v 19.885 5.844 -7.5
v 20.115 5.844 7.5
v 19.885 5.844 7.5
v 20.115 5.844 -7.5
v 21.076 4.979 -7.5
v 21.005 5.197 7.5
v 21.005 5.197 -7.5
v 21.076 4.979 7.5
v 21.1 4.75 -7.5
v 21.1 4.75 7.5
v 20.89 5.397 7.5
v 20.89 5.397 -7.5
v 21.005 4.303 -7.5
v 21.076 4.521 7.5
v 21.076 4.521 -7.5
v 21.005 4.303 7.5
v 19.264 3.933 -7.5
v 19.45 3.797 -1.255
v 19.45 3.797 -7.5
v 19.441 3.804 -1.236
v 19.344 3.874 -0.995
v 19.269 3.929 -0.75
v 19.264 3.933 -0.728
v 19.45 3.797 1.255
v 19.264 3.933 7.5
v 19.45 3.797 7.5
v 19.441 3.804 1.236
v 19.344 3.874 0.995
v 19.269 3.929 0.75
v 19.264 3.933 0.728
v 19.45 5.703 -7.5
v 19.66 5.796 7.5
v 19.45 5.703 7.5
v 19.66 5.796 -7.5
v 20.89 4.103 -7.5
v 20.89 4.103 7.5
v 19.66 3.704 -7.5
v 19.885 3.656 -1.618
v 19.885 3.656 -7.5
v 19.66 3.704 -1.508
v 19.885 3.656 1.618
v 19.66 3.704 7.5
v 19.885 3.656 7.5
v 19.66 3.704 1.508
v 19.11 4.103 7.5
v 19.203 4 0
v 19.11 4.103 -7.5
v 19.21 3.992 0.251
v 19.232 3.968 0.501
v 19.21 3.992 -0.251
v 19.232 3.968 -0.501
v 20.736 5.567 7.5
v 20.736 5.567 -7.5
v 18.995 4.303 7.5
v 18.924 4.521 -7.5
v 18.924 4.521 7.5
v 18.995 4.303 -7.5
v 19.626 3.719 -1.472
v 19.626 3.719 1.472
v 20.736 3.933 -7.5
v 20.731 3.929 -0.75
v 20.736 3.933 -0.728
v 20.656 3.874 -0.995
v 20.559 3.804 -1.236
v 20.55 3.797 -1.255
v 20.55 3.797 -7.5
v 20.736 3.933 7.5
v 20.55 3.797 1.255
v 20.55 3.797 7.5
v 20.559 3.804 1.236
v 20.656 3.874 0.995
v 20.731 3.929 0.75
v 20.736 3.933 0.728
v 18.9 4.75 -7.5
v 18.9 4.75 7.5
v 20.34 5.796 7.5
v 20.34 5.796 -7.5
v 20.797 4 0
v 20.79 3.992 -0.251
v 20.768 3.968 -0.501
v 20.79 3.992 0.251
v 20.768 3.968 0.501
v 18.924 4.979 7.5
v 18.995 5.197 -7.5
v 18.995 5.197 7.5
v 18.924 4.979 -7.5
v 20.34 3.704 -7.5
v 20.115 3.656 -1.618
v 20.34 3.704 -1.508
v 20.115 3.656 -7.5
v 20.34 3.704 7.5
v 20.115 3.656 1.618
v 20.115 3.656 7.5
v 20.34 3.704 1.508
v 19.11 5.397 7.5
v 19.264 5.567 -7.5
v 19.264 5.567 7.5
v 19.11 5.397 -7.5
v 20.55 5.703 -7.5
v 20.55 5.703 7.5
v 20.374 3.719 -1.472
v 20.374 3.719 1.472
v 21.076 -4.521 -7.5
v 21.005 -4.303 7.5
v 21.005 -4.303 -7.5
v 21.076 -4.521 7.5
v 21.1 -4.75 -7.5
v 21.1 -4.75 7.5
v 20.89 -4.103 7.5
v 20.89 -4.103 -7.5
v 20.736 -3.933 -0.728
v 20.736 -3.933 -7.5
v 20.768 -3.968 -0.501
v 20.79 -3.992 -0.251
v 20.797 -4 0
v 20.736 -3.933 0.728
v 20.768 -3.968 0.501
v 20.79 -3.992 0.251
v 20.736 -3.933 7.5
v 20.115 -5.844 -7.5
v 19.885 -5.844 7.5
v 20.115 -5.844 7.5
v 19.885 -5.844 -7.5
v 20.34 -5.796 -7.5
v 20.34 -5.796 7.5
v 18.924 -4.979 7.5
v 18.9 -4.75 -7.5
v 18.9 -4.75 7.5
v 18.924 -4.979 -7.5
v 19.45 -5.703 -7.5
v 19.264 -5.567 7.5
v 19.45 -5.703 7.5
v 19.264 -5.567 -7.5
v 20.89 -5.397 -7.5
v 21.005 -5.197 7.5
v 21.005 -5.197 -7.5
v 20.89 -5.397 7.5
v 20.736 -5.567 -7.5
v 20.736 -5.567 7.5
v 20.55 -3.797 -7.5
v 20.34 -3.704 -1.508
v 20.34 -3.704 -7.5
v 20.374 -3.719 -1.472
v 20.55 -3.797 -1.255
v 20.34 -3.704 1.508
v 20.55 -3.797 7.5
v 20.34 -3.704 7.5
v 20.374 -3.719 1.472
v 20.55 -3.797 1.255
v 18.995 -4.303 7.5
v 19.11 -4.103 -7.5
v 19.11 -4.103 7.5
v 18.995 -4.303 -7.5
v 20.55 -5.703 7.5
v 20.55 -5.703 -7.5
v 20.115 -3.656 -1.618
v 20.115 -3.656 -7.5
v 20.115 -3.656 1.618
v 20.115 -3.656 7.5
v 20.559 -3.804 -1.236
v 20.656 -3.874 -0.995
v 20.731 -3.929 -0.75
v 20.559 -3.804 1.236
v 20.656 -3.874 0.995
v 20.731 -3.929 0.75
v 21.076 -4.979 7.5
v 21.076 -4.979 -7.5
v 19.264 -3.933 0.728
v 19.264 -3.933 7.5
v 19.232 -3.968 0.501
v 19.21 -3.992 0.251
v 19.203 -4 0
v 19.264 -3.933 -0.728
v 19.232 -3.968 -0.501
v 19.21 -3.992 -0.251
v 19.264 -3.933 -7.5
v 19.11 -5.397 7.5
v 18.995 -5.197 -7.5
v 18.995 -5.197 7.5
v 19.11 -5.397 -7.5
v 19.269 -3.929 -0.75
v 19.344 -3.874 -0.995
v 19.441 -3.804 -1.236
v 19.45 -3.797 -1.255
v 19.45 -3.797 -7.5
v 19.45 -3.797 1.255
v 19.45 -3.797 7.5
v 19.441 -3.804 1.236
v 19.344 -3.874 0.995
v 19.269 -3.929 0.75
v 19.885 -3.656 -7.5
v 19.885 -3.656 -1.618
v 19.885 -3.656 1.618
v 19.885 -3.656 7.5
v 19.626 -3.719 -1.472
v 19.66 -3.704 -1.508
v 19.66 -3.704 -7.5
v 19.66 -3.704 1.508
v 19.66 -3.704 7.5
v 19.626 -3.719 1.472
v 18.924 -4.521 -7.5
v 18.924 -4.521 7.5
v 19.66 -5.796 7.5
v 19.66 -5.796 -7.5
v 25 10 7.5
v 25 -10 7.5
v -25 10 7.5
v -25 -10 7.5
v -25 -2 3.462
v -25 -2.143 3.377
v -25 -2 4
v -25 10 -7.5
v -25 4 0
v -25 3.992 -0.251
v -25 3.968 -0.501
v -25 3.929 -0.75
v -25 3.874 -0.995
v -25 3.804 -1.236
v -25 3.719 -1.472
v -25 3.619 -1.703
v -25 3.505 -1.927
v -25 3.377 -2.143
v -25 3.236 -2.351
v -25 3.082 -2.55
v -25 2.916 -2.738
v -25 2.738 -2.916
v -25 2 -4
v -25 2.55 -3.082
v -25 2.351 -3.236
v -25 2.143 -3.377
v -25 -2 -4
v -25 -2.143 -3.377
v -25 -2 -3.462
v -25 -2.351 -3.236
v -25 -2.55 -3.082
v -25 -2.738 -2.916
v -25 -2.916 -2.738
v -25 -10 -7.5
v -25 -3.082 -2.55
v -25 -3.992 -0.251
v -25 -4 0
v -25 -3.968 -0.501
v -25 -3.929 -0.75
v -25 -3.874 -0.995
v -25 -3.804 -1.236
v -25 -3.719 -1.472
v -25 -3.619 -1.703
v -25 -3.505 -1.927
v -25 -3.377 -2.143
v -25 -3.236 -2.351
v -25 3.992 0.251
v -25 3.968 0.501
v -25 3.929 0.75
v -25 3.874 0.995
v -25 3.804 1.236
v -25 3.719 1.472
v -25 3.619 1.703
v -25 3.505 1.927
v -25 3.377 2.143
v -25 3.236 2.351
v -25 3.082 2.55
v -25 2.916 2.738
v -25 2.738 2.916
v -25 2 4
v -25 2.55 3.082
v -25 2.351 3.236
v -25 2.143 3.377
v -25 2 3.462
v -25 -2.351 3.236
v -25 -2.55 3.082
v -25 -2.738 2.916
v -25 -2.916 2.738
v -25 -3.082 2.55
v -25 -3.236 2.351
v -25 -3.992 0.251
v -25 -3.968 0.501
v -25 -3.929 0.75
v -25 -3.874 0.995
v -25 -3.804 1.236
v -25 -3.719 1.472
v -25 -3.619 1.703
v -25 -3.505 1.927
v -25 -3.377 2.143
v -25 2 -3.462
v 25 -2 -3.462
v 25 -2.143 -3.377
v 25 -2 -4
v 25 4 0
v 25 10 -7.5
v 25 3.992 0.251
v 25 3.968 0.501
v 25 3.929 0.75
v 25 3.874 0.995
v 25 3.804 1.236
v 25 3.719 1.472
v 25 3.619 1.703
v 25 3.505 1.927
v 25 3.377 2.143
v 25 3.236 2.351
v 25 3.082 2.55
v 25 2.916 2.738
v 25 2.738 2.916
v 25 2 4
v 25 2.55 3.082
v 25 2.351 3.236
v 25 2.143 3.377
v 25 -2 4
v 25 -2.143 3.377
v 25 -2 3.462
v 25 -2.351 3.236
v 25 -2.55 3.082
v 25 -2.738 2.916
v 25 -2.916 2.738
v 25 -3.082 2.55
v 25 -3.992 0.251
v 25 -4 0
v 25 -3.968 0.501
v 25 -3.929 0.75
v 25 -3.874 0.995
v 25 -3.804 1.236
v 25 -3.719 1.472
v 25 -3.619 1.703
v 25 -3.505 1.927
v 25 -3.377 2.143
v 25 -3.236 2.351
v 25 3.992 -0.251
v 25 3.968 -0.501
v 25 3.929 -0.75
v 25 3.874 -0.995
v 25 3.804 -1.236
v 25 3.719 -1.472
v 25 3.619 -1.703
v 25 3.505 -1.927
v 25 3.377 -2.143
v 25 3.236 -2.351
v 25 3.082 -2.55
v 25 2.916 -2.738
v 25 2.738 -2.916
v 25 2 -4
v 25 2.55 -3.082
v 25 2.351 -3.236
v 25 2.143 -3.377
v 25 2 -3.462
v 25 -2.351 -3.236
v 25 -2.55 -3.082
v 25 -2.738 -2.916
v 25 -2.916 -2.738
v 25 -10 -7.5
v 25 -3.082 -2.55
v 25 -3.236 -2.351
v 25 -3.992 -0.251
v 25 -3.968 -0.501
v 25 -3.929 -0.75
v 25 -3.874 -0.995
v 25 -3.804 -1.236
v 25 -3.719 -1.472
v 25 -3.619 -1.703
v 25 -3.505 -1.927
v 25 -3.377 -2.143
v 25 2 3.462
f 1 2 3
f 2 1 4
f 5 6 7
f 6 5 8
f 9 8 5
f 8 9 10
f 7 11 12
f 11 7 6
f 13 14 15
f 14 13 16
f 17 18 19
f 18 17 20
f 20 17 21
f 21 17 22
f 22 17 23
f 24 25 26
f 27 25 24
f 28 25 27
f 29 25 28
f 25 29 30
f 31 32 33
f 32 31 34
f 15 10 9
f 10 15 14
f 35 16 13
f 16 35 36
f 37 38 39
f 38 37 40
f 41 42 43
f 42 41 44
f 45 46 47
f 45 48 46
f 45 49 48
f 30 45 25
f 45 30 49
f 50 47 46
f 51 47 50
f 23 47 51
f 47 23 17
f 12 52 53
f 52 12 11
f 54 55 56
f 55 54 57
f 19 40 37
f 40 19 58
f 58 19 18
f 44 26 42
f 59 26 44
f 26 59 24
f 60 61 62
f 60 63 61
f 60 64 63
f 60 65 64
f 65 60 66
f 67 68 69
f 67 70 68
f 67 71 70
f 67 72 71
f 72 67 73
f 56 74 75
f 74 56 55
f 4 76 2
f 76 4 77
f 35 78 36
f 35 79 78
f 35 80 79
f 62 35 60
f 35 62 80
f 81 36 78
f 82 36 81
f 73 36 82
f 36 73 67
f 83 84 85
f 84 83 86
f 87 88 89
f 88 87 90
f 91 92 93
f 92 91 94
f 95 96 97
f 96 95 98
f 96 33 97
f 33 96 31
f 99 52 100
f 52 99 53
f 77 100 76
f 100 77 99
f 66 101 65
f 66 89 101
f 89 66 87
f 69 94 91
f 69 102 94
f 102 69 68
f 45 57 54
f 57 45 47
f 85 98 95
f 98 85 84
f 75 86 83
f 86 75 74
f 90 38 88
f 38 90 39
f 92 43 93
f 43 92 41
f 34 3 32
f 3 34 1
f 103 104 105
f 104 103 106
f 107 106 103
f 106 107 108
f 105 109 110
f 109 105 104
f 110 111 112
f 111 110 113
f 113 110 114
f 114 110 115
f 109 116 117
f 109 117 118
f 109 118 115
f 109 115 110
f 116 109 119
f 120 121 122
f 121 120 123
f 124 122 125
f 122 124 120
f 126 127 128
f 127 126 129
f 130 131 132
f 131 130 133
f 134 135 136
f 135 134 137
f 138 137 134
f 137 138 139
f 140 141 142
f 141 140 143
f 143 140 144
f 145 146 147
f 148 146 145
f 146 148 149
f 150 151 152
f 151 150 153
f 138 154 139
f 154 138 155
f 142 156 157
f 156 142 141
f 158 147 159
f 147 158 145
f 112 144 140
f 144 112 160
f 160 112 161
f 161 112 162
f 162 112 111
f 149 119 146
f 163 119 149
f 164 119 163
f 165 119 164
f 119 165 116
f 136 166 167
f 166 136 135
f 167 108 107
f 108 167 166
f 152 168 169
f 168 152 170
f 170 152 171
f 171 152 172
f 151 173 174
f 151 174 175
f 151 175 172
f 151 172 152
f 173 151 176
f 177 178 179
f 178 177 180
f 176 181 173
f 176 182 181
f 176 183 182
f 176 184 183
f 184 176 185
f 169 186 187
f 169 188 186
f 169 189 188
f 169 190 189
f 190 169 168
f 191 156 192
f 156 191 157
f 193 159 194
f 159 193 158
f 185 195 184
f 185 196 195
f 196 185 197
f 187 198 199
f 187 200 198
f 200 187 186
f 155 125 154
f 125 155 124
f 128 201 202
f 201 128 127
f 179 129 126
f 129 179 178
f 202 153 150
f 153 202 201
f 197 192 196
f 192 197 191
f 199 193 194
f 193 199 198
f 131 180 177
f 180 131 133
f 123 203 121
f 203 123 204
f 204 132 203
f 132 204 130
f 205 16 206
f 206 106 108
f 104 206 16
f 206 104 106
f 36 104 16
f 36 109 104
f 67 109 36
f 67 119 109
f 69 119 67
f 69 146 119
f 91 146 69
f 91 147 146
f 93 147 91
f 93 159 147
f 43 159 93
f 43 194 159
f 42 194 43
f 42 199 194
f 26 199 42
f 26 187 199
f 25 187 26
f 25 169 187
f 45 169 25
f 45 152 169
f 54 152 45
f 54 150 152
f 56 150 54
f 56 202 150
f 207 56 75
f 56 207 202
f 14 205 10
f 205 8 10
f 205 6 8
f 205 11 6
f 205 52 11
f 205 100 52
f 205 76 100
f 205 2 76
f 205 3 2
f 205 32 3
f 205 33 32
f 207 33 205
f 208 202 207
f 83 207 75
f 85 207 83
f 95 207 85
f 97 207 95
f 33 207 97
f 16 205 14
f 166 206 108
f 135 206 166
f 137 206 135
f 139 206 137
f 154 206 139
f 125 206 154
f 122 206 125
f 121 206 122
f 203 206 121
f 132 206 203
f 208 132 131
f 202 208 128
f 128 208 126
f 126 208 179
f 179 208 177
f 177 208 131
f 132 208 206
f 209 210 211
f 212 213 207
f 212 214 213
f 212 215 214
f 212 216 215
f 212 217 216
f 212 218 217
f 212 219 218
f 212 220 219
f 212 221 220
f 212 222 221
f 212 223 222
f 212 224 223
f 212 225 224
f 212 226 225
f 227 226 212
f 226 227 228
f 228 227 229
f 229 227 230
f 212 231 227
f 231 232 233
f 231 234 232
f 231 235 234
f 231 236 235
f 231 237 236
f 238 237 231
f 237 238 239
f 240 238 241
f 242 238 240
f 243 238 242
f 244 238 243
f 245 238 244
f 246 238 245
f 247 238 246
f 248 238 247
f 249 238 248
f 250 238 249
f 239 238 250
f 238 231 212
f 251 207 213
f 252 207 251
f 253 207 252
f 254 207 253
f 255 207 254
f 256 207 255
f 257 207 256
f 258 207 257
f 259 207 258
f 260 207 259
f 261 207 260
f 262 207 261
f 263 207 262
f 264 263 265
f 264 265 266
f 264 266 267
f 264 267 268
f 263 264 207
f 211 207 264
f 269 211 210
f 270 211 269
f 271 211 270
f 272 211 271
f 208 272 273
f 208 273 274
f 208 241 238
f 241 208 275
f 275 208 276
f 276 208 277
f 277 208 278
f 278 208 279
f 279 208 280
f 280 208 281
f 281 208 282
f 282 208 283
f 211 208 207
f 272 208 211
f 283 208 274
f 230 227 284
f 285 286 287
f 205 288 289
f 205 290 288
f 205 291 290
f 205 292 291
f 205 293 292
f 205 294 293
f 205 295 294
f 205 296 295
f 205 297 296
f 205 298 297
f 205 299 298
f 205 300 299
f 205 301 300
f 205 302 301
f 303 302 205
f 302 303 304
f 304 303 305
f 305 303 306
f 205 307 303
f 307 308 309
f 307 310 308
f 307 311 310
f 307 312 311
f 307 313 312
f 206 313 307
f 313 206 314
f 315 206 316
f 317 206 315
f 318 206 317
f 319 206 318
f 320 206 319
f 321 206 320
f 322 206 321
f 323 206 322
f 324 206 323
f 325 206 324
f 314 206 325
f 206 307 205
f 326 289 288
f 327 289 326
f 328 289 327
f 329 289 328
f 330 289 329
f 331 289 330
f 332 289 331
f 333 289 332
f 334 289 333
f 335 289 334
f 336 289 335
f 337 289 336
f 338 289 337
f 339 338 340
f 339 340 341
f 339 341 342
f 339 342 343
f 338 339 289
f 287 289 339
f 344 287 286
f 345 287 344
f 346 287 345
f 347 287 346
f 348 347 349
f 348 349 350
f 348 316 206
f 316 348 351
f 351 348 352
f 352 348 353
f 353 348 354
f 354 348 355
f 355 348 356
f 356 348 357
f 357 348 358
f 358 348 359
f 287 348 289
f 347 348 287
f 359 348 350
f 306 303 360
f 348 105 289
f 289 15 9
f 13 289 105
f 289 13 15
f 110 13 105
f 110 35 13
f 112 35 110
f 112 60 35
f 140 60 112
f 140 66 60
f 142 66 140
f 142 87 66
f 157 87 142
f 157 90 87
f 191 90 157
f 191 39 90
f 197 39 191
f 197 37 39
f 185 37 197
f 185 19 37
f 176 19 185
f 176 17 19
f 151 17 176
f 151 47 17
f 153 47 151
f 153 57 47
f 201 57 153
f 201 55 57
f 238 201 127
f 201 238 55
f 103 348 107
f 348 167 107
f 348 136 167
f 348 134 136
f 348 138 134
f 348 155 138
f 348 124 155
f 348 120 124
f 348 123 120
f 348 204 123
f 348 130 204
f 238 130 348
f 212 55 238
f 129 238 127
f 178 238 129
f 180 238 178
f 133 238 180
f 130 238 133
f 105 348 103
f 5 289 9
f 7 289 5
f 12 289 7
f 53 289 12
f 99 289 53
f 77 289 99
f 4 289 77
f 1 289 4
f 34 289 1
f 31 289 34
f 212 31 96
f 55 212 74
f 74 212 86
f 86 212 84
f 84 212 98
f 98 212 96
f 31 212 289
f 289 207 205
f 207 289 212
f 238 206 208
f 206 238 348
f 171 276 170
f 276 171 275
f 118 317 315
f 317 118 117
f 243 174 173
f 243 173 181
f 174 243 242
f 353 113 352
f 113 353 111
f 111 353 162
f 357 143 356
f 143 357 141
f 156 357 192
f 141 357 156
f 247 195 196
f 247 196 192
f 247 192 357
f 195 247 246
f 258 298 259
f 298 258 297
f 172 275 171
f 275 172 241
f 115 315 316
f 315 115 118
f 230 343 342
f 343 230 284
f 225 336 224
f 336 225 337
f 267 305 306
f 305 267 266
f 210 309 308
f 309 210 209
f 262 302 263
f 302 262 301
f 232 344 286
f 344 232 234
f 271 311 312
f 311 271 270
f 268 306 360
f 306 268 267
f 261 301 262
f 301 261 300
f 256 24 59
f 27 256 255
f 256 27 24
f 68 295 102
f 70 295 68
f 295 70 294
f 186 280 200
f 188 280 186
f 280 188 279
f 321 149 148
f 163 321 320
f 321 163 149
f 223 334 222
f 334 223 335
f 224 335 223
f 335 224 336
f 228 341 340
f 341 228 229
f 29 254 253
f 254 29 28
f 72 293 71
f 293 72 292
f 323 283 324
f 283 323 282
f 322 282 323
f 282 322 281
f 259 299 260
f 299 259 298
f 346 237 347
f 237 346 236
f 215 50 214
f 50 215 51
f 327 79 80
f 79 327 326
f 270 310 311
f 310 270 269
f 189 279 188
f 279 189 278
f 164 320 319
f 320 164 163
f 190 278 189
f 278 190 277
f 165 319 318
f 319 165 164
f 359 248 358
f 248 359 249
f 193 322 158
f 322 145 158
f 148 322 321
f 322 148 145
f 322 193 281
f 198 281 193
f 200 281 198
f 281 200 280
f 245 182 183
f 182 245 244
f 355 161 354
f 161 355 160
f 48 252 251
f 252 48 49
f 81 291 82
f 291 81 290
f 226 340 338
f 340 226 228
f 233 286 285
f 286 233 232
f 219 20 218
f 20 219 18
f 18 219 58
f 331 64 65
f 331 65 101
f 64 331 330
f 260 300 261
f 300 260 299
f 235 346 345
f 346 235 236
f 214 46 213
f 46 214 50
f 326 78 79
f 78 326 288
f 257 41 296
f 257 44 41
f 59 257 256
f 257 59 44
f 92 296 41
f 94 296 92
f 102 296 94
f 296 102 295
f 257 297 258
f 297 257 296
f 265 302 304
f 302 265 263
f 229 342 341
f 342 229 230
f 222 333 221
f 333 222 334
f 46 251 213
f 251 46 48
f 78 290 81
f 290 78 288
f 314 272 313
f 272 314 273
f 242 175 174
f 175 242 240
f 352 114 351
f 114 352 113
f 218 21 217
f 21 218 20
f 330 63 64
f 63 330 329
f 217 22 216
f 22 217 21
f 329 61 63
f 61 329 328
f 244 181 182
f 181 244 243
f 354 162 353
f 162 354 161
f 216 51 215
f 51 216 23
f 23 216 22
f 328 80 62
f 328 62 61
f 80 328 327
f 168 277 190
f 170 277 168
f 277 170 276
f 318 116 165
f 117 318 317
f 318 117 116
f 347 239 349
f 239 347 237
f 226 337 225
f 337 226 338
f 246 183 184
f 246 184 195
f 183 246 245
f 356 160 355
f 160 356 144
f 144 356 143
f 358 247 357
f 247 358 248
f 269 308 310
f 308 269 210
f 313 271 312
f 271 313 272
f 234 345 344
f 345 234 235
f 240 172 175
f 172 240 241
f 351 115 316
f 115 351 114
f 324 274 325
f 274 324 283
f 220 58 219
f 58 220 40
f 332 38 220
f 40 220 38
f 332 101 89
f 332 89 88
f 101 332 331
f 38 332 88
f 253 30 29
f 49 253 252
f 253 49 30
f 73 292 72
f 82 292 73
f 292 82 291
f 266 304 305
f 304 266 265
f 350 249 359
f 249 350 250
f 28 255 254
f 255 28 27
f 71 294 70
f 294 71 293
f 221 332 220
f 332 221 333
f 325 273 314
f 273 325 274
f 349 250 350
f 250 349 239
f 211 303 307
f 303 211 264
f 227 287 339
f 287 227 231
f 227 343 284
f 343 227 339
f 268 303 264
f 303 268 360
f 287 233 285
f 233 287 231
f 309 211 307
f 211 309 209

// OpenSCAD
module rod_block(
                   width=60,
                   height=10,
                   depth=10,
                   rod_diameter=8.6,
                   endstop=false,
                   endstop_screw_size=2.2,
                   endstop_screw_sep=9.5,
                   endstop_screw_depth=6
                   )
    {
    // x rod gaps  
    rotate([0,-90,0])

    difference(){
        cube([height, depth, width], center=true);
        cylinder(h=2*width, r=rod_diameter/2, center=true, $fn=100);
        cube([rod_diameter, rod_diameter/2, 2*width], center=true);
        if(endstop) {
            rotate([0,90,0]) {
                translate([width/2-endstop_screw_depth,endstop_screw_sep/2,0])
                    cylinder(h=2*height, r=endstop_screw_size/2, center=true, $fn=30);
                translate([width/2-endstop_screw_depth,-endstop_screw_sep/2,0])
                    cylinder(h=2*height, r=endstop_screw_size/2, center=true, $fn=30);
            }
        }
    }
}

rod_block(width=50, 
           height=15, 
           depth=20,
           rod_diameter=8,
           endstop=true,
           endstop_screw_size=2.2,
           endstop_screw_sep=9.5,
           endstop_screw_depth=5);
